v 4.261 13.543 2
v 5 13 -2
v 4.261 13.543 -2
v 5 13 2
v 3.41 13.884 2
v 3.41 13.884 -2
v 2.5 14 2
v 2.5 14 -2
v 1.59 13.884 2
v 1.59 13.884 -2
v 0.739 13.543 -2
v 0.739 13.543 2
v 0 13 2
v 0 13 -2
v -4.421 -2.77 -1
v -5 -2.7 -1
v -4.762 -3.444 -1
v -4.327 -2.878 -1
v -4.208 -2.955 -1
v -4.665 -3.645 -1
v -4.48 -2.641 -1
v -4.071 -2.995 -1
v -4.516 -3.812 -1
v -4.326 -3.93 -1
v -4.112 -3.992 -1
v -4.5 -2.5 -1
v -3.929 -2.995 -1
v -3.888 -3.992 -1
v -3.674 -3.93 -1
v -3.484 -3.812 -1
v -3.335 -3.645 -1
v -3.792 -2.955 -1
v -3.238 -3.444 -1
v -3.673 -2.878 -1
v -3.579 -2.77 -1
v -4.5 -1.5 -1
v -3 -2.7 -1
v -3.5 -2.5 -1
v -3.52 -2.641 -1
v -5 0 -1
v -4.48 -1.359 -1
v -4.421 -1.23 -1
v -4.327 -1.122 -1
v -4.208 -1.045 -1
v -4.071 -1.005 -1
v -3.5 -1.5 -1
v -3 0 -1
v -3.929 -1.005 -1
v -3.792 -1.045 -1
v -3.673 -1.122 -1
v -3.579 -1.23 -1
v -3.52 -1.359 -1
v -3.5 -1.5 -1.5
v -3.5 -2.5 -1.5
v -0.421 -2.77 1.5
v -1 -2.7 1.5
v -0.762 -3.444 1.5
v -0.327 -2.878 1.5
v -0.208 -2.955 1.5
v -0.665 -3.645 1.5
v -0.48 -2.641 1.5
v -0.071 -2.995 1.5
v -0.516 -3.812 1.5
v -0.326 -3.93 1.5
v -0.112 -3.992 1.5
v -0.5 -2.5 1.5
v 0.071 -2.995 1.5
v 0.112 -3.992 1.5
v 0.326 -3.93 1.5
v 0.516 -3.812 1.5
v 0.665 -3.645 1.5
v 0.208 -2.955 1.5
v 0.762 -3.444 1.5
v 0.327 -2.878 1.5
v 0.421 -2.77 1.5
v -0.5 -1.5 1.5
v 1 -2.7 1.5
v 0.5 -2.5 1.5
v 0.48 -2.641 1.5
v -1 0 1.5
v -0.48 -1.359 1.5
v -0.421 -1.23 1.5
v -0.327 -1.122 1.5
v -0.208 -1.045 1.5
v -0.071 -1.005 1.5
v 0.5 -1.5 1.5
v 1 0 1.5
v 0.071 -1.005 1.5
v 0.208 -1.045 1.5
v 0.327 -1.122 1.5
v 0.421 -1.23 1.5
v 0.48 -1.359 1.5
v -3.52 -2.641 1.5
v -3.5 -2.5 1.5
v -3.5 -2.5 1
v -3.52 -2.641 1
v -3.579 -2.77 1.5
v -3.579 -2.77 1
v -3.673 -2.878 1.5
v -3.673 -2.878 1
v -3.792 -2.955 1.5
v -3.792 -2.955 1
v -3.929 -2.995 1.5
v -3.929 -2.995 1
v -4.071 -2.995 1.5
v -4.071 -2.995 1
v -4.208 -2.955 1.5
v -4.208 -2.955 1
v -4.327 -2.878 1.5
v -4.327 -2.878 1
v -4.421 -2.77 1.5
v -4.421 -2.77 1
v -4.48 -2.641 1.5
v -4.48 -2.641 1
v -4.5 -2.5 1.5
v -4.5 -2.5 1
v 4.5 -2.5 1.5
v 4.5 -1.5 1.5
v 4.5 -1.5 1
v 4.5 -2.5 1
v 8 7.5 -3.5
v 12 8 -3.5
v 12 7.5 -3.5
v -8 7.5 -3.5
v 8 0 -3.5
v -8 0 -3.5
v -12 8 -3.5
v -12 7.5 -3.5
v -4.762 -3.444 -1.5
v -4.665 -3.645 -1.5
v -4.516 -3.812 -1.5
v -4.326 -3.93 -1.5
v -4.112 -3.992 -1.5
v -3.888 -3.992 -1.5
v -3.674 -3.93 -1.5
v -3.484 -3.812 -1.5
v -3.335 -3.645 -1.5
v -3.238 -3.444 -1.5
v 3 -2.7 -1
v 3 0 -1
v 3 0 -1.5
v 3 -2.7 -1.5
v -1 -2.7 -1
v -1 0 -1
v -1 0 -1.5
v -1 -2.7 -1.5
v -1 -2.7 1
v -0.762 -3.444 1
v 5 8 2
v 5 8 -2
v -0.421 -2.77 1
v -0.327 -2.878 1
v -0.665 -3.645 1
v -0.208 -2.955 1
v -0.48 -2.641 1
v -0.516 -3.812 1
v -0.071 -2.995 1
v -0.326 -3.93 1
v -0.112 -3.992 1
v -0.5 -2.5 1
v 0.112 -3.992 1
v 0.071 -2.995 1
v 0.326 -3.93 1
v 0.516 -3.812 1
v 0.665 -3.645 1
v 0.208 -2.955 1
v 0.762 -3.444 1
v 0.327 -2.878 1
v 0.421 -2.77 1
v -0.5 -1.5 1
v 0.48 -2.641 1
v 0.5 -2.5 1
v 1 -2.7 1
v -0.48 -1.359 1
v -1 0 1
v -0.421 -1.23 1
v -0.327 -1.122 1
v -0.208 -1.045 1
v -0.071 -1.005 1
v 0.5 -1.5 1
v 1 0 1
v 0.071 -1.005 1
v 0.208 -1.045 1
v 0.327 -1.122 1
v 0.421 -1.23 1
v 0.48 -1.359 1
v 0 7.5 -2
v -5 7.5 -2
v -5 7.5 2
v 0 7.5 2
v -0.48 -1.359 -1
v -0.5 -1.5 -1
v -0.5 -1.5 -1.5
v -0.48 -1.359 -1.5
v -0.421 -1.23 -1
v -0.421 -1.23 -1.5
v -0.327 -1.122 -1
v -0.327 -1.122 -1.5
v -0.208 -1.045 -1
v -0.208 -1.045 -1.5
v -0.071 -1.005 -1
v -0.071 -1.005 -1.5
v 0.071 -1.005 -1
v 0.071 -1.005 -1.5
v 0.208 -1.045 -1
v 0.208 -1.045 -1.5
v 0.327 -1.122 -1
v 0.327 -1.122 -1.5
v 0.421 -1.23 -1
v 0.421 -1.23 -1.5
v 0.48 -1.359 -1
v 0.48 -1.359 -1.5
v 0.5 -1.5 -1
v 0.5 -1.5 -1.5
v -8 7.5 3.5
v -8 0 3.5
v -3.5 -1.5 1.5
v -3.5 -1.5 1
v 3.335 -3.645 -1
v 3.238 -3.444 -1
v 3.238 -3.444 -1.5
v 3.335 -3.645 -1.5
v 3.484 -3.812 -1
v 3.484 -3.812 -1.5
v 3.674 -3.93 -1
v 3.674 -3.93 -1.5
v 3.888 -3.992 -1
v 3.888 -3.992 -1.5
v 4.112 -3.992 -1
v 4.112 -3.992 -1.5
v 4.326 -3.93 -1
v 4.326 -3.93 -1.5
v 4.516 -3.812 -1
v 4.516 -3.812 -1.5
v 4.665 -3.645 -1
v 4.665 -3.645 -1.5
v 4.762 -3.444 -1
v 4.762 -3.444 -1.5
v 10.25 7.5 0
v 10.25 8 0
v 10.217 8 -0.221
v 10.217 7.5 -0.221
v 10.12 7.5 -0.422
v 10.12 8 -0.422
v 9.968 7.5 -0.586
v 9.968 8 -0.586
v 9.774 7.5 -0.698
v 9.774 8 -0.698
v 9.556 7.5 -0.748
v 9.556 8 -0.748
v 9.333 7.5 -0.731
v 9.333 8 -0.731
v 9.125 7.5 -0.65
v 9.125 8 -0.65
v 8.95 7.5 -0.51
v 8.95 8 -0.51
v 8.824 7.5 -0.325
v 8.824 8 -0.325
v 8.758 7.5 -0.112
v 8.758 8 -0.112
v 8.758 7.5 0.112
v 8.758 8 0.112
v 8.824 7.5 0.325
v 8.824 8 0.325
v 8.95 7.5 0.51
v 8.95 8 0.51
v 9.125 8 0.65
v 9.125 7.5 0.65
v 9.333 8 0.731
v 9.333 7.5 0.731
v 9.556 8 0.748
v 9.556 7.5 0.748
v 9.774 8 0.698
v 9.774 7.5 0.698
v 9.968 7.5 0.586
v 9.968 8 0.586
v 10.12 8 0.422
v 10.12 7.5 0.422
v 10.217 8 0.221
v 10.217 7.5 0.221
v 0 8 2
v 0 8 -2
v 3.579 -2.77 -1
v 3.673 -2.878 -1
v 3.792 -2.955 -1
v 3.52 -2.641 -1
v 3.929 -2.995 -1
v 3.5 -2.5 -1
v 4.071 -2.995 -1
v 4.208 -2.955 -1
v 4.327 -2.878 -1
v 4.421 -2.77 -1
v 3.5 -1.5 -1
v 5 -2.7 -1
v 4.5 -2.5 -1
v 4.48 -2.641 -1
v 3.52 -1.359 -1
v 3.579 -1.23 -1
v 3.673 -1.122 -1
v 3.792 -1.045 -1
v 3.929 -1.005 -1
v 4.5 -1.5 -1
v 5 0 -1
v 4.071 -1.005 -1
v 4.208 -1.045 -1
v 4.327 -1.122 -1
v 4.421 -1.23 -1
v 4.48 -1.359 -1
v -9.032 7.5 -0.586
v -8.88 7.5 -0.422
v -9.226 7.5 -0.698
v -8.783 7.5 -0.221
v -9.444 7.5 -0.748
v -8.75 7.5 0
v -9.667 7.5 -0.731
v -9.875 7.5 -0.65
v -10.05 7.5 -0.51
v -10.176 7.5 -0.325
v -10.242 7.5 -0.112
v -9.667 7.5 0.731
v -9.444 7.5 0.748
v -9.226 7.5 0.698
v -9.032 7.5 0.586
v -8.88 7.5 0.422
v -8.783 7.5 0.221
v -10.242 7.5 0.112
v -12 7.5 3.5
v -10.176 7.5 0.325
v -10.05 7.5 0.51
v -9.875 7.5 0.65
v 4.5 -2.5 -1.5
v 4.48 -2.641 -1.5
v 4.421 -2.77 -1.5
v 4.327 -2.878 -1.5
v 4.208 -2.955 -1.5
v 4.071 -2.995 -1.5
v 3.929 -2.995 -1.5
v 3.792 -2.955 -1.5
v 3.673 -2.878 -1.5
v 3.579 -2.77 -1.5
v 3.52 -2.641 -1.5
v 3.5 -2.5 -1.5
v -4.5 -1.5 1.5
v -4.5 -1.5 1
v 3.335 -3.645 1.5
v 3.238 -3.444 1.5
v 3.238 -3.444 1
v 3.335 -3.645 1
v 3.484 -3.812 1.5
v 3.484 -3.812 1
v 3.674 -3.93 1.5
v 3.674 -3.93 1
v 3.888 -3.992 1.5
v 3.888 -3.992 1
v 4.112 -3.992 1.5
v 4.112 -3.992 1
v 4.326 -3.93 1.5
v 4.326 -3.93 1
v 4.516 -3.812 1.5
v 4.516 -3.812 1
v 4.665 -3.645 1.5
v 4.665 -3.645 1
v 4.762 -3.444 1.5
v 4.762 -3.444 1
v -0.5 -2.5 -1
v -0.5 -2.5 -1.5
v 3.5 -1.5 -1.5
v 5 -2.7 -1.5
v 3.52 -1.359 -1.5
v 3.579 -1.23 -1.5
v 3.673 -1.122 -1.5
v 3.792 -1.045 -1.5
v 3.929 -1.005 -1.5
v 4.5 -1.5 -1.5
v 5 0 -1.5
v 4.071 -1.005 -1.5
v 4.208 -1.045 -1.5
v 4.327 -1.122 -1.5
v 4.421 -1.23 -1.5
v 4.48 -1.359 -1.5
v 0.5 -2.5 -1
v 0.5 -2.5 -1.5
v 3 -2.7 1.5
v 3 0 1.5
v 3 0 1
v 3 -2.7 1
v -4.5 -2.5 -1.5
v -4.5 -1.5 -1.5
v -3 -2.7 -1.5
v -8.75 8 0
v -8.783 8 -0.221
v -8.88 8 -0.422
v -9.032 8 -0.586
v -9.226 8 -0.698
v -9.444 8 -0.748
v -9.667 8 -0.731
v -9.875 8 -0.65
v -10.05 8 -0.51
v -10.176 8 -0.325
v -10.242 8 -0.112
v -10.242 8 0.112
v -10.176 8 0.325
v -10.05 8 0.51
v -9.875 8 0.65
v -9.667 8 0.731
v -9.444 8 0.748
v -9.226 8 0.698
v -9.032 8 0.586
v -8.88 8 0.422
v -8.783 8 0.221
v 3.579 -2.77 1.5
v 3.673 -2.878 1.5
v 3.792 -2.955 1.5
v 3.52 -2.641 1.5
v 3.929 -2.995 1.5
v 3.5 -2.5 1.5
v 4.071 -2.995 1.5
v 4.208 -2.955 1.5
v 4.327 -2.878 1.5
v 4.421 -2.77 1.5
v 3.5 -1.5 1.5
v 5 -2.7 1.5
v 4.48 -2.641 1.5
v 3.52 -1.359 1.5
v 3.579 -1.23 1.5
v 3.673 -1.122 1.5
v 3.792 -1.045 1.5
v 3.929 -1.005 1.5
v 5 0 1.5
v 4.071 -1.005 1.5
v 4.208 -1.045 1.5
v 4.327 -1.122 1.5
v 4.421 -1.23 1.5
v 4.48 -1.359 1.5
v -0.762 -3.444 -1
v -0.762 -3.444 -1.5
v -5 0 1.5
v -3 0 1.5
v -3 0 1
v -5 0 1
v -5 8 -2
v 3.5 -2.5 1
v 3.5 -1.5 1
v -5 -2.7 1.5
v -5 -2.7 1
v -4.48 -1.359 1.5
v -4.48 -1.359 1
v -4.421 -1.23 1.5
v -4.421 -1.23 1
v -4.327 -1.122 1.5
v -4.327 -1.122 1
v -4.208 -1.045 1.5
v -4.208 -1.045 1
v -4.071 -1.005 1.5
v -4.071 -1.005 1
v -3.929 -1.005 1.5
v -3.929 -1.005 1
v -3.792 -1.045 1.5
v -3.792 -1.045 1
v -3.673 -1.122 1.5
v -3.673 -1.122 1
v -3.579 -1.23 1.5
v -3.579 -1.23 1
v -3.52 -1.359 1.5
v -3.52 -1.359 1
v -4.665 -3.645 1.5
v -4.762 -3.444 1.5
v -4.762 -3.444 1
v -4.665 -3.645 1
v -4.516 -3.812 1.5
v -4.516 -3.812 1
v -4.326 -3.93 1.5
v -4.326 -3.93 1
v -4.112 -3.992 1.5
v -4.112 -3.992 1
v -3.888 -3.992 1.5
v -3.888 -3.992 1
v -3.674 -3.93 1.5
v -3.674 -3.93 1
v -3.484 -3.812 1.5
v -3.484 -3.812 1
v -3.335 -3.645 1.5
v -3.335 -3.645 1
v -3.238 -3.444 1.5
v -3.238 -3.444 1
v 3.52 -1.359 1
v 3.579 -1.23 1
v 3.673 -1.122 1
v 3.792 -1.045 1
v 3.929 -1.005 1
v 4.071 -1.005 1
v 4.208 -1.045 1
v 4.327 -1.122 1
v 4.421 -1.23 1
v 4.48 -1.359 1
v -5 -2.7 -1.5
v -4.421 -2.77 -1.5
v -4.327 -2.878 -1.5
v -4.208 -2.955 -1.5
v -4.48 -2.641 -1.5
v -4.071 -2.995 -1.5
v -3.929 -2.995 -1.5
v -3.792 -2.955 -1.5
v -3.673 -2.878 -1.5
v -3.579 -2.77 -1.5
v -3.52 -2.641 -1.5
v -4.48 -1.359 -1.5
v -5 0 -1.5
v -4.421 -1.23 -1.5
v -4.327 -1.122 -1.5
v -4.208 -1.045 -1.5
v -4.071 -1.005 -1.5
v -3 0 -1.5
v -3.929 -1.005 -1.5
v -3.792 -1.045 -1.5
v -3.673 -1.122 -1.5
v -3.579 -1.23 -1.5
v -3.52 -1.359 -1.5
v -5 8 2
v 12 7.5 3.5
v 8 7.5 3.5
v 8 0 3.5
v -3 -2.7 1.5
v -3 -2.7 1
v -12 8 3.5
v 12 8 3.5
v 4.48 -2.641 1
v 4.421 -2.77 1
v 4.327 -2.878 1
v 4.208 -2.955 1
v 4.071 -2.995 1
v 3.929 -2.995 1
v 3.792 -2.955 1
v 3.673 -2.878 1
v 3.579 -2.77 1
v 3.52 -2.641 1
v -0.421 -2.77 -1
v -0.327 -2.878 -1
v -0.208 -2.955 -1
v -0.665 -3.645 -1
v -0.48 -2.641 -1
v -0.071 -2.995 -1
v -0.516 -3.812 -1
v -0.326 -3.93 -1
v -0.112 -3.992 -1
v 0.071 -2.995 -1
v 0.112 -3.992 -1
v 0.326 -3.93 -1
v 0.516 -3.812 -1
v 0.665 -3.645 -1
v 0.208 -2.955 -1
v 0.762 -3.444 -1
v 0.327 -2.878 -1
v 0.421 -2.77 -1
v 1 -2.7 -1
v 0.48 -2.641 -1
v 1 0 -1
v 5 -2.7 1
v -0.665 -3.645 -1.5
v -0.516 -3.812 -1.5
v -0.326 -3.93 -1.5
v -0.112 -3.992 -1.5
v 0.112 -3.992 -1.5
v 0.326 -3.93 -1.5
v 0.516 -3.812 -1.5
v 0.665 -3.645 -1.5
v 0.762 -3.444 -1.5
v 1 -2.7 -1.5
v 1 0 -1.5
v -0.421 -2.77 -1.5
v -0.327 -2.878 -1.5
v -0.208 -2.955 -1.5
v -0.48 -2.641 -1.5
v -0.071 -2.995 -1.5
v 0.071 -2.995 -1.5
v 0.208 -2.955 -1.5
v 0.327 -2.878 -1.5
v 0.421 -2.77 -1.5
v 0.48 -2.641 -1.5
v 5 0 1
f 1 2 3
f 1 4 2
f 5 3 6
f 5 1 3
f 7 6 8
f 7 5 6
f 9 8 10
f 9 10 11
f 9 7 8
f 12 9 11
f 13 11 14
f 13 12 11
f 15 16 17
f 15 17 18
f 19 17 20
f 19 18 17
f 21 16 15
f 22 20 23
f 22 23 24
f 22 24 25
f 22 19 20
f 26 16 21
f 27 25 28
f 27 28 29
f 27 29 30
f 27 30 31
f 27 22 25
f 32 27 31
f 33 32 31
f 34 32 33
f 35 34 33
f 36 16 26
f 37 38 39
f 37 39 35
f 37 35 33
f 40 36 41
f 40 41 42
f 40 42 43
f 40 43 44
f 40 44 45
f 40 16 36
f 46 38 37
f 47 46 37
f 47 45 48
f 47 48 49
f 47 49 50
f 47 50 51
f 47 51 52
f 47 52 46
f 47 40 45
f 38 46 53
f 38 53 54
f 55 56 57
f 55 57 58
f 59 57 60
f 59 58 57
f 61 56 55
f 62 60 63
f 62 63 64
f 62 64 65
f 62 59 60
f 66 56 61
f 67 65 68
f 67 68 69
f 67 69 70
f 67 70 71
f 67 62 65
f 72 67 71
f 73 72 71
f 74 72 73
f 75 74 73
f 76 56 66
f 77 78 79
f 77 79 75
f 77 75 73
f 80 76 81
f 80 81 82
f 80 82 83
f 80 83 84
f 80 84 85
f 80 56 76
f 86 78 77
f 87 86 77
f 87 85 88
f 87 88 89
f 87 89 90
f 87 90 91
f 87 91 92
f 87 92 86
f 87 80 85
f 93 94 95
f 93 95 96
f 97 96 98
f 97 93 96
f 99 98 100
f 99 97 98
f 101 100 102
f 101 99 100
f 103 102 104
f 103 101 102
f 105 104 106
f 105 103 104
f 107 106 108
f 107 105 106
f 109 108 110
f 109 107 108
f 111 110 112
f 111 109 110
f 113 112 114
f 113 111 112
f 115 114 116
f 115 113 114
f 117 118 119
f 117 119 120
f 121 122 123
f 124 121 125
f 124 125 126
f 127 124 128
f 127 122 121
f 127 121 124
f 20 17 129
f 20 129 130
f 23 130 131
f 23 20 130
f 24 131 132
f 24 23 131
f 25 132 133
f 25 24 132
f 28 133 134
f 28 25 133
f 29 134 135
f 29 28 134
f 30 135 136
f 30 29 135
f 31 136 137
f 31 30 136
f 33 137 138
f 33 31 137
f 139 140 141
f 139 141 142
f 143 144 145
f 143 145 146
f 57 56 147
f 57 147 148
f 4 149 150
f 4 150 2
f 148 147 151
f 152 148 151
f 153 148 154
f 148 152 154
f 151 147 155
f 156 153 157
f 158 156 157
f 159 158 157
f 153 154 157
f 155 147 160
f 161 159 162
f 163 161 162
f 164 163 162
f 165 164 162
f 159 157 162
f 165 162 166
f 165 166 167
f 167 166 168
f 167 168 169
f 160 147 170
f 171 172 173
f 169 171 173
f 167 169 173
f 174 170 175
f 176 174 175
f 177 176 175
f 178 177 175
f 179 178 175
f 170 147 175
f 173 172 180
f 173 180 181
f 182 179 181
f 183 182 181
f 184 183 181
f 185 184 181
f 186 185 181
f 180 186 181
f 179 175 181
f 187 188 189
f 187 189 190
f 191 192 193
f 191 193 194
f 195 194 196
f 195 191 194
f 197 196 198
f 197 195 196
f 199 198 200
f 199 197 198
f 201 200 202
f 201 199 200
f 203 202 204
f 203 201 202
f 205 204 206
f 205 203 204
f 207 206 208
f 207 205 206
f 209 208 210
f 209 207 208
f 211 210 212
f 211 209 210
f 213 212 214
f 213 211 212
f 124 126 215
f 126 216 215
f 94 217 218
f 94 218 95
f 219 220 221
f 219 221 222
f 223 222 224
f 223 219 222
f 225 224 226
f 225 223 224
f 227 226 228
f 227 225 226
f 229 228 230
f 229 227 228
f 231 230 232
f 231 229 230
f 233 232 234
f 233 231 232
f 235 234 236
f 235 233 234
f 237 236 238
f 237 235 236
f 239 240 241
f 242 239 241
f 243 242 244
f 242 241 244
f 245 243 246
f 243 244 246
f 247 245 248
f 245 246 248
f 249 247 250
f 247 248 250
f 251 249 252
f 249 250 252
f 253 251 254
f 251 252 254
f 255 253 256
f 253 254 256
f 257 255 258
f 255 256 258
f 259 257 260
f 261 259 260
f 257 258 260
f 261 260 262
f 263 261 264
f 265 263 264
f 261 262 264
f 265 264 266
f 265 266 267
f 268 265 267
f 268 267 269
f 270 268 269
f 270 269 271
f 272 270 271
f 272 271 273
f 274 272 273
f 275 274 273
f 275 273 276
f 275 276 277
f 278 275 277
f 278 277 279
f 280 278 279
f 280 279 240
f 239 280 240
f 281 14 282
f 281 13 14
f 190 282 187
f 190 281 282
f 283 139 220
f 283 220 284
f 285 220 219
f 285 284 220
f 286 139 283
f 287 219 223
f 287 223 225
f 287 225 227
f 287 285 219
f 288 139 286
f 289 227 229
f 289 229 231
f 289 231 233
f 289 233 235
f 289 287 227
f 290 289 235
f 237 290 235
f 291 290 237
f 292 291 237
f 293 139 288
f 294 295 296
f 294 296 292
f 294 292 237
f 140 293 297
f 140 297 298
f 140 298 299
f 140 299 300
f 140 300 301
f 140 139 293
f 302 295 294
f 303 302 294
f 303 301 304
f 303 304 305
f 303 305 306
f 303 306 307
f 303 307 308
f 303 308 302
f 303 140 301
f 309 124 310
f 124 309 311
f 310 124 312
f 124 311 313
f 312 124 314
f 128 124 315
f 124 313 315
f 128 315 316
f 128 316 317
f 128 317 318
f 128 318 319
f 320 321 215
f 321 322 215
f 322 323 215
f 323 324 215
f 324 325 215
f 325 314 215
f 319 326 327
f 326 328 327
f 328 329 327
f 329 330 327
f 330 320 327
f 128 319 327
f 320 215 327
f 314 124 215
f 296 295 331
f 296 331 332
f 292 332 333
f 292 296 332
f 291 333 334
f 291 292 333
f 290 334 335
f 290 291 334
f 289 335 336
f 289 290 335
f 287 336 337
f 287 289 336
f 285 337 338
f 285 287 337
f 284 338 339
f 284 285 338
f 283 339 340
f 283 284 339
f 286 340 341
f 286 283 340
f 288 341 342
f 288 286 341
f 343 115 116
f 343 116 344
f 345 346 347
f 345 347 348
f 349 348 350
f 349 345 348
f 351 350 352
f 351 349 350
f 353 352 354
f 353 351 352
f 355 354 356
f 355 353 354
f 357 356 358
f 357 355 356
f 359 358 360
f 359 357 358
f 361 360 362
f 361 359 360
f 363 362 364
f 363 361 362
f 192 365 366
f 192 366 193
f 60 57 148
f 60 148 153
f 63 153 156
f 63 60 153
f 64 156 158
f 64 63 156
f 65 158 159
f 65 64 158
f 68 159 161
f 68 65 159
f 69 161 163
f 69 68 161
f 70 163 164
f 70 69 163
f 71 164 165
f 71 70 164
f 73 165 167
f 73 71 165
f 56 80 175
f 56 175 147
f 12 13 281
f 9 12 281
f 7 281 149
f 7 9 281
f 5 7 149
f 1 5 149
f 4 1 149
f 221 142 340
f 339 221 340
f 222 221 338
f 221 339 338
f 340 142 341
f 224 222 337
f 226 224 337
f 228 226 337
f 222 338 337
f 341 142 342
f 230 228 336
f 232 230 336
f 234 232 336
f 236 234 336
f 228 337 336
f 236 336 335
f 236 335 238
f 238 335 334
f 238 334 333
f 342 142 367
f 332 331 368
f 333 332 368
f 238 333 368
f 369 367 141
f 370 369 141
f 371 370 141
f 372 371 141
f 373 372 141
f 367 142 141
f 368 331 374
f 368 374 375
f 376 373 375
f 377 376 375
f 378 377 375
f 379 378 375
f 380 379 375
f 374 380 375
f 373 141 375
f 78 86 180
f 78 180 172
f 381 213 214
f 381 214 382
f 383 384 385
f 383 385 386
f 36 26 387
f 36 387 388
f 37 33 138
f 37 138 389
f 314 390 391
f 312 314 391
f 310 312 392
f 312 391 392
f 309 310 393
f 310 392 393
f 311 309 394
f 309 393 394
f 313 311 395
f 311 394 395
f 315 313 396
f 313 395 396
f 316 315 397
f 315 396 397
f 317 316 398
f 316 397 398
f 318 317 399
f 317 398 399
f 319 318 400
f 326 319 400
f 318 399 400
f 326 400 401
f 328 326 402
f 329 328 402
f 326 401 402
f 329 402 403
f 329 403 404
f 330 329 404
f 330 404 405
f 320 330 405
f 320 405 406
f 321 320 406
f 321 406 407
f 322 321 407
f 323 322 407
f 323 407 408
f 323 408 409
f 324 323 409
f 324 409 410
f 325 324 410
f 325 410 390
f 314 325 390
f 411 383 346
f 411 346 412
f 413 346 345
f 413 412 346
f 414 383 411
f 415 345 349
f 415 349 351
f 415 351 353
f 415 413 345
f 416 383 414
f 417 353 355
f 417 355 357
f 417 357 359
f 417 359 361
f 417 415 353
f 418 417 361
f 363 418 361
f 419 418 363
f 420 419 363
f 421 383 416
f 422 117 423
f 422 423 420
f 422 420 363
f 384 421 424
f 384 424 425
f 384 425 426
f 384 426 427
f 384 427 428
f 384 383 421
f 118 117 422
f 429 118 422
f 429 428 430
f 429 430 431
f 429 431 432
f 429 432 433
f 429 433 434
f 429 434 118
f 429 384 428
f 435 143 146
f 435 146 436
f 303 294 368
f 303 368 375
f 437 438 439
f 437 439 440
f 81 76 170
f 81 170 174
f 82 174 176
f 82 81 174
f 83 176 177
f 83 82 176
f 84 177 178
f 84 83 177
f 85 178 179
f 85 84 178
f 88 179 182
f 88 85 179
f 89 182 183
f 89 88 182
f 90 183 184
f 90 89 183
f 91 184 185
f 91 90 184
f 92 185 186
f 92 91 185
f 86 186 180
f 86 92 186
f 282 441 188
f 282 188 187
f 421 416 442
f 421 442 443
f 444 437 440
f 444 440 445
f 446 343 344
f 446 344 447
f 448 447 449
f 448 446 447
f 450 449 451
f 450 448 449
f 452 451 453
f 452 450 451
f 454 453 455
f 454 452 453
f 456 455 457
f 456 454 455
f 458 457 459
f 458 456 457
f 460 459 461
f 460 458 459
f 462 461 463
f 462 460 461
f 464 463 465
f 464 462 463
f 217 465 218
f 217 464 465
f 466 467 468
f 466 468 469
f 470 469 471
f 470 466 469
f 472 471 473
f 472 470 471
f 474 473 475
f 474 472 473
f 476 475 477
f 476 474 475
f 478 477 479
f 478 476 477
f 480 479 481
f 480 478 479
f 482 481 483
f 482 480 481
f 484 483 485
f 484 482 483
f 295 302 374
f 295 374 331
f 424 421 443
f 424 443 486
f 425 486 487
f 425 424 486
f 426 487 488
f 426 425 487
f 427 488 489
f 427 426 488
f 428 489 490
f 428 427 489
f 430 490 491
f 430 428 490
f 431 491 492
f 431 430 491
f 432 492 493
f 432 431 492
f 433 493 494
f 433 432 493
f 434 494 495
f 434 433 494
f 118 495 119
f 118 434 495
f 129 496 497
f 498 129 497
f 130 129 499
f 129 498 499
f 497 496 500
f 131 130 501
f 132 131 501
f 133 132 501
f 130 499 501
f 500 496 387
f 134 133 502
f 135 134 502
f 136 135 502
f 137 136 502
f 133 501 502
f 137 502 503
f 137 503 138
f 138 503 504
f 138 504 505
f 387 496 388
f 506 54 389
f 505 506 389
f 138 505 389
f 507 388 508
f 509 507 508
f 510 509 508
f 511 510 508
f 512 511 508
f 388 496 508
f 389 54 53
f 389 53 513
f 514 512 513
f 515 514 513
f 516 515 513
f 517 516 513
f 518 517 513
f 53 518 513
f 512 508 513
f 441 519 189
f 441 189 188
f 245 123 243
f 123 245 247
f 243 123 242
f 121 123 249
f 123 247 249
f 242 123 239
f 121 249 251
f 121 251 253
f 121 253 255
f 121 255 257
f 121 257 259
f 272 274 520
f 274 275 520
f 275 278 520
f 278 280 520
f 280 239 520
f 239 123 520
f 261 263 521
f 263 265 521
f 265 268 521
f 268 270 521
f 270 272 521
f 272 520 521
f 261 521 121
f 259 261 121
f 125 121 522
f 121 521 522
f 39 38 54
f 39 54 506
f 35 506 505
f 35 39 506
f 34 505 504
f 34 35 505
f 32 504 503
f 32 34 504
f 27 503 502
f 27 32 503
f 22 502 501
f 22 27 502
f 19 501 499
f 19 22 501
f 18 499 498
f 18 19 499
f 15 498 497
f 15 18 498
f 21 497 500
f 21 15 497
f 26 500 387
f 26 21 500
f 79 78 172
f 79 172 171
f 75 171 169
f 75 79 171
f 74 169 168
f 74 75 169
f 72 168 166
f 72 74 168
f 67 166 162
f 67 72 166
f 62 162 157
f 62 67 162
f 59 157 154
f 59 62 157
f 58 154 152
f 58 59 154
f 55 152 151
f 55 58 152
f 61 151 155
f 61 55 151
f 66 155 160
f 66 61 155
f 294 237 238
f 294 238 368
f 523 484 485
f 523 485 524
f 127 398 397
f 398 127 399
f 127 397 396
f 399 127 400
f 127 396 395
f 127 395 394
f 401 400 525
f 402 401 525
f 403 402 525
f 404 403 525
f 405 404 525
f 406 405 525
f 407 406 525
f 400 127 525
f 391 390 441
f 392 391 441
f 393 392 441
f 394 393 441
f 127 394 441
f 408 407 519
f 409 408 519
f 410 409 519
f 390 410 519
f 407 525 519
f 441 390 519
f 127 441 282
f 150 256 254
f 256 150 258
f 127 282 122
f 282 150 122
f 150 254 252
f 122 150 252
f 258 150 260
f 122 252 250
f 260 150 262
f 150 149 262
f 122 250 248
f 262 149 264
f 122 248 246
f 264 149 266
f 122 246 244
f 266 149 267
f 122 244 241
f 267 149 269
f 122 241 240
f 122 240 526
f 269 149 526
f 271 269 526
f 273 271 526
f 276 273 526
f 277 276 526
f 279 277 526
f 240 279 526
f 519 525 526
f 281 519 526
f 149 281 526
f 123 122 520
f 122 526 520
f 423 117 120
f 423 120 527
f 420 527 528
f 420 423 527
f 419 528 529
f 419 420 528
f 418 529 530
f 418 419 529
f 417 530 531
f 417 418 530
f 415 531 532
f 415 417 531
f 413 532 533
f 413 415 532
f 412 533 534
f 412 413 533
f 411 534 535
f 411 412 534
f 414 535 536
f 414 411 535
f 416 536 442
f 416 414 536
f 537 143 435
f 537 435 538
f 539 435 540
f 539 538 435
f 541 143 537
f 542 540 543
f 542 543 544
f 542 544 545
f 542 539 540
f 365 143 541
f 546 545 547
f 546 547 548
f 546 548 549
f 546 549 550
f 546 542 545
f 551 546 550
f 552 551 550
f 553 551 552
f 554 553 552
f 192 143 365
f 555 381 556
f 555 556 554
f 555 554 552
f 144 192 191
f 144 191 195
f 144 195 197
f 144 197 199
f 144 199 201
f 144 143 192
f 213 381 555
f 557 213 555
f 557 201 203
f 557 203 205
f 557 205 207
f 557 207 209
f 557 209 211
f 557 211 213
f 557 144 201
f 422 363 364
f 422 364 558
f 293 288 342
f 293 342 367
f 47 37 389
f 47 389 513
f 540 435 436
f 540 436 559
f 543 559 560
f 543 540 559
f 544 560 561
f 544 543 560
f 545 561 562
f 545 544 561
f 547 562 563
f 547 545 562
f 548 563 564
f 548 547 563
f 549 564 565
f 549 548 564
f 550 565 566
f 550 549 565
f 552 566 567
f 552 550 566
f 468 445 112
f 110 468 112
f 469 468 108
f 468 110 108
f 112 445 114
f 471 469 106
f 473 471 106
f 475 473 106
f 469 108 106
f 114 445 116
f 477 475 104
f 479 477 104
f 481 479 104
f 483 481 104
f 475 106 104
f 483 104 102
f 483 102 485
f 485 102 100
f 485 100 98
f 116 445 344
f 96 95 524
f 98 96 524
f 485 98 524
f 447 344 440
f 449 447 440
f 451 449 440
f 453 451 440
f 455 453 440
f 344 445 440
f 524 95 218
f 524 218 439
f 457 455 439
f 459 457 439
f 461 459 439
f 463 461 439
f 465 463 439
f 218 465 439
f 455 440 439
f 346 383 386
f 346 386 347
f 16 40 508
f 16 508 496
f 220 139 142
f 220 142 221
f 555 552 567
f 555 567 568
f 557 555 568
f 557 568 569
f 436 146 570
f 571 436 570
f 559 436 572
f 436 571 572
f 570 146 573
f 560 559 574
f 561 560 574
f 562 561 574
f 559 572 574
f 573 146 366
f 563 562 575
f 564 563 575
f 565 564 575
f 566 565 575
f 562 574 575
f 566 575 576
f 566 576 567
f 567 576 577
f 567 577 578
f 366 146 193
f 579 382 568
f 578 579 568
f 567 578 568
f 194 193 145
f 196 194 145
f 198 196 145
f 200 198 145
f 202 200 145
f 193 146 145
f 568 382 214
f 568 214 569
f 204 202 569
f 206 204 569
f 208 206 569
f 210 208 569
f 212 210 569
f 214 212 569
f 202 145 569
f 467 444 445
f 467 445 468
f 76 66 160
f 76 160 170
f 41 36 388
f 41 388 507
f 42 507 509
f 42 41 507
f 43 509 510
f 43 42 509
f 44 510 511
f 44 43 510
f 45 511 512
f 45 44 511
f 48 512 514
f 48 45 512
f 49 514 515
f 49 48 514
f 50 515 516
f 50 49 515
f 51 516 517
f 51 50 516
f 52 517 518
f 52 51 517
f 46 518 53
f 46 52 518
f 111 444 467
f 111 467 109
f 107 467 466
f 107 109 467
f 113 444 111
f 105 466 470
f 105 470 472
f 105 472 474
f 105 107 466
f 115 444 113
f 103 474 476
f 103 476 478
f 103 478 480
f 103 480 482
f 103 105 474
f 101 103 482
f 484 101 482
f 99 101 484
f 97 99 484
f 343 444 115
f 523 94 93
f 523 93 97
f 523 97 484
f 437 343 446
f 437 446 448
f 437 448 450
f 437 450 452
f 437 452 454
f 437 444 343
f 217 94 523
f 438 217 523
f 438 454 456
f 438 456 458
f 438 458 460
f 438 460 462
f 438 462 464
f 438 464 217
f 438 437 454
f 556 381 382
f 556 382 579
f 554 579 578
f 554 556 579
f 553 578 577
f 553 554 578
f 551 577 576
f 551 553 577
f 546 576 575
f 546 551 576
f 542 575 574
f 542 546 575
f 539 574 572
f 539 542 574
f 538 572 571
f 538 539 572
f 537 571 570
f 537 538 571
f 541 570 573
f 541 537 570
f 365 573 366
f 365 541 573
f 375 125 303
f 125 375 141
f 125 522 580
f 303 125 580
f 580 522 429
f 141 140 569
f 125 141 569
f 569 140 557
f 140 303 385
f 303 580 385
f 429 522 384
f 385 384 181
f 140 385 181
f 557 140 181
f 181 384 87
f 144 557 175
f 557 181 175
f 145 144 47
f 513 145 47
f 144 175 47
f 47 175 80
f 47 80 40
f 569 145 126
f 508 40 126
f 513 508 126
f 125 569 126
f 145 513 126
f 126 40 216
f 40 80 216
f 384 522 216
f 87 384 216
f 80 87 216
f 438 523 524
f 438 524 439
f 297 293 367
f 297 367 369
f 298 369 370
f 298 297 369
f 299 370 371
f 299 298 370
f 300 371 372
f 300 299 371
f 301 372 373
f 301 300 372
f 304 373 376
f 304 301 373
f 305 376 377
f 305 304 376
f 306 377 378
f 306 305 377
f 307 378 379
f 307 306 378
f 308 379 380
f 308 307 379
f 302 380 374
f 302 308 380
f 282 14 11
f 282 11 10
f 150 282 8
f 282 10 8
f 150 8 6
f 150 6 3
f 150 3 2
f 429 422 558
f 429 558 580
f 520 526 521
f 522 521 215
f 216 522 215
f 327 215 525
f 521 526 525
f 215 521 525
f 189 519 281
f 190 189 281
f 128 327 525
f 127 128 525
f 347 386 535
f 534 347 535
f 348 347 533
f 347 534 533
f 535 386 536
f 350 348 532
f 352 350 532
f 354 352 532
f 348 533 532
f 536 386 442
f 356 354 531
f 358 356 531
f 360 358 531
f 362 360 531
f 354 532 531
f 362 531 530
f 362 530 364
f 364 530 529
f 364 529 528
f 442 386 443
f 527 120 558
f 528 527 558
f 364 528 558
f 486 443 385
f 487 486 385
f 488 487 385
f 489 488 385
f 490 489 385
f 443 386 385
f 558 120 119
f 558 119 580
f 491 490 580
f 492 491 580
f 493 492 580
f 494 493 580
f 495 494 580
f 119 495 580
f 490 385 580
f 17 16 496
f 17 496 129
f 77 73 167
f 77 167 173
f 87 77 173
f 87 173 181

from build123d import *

# Parameters (mm, degrees)
AUFSATZ_LINEAR_AUSTRAGEN1_DEPTH = 3.5
AUFSATZ_LINEAR_AUSTRAGEN2_DEPTH = 2
AUFSATZ_LINEAR_START            = -2
AUFSATZ_LINEAR_AUSTRAGEN3_DEPTH = 0.5
LINEARES_MUSTER1_COUNT          = 3
LINEARES_MUSTER1_PITCH          = 4
LINEARES_MUSTER1_COUNT_DIR2     = 2
LINEARES_MUSTER1_PITCH_DIR2     = 2.5
SKIZZE3_R                       = 0.75
SCHNITT_LINEAR_AUSTRAGEN1_DEPTH = 18.327723451
SKIZZE4_W                       = 5
SKIZZE4_H                       = 4
SCHNITT_LINEAR_AUSTRAGEN2_DEPTH = 0.5


with BuildPart() as part:
    # Skizze1 → Aufsatz-Linear austragen1 (new, symmetric)
    with BuildSketch(Plane.XY):
        Polygon((-12, 8), (-12, 7.5), (-8, 7.5), (-8, 0), (8, 0), (8, 7.5), (12, 7.5), (12, 8), align=None)
    extrude(amount=AUFSATZ_LINEAR_AUSTRAGEN1_DEPTH, both=True)

    # Skizze1<3> → Aufsatz-Linear austragen2 (add, symmetric)
    with BuildSketch(Plane.XY):
        with BuildLine():
            Line((0, 13), (0, 8))
            Line((0, 8), (5, 8))
            Line((5, 8), (5, 13))
            ThreePointArc((5, 13), (2.5, 14), (0, 13))
        make_face()
    extrude(amount=AUFSATZ_LINEAR_AUSTRAGEN2_DEPTH, both=True)


with BuildPart() as body_2:
    # Skizze2 → Aufsatz-Linear austragen3 (new body)
    with BuildSketch(Plane.XY.offset(3.5).offset(AUFSATZ_LINEAR_START)):
        with BuildLine():
            Line((-5, 0), (-5, -2.7))
            Line((-5, -2.7), (-4.76192799, -3.443855979))
            ThreePointArc((-4.76192799, -3.443855979), (-4, -4), (-3.23807201, -3.443855979))
            Line((-3.23807201, -3.443855979), (-3, -2.7))
            Line((-3, -2.7), (-3, 0))
            Line((-3, 0), (-5, 0))
        make_face()
        with BuildLine():
            Line((-3.5, -1.5), (-3.5, -2.5))
            ThreePointArc((-3.5, -2.5), (-4, -3), (-4.5, -2.5))
            Line((-4.5, -2.5), (-4.5, -1.5))
            ThreePointArc((-4.5, -1.5), (-4, -1), (-3.5, -1.5))
        make_face(mode=Mode.SUBTRACT)
    aufsatz_linear_austragen3 = extrude(amount=-AUFSATZ_LINEAR_AUSTRAGEN3_DEPTH)


with BuildPart() as part_1:
    add(part.part)

    # Lineares Muster1: Aufsatz-Linear austragen3 3 × 2
    with Locations(*[(i * LINEARES_MUSTER1_PITCH, 0, -j * LINEARES_MUSTER1_PITCH_DIR2) for i in range(LINEARES_MUSTER1_COUNT) for j in range(LINEARES_MUSTER1_COUNT_DIR2) if (i, j) != (0, 0)]):
        add(aufsatz_linear_austragen3)

    # Skizze3 → Schnitt-Linear austragen1 (cut, through all)
    with BuildSketch(Plane(origin=(0, 8, 0), x_dir=(1, 0, 0), z_dir=(0, 1, 0))):
        with Locations((-9.5, 0)):
            Circle(SKIZZE3_R)
        with Locations((9.5, 0)):
            Circle(SKIZZE3_R)
    extrude(amount=-SCHNITT_LINEAR_AUSTRAGEN1_DEPTH, mode=Mode.SUBTRACT)

    # Skizze4 → Schnitt-Linear austragen2 (cut)
    with BuildSketch(Plane(origin=(0, 8, 0), x_dir=(1, 0, 0), z_dir=(0, 1, 0))):
        with Locations((-2.5, 0)):
            Rectangle(SKIZZE4_W, SKIZZE4_H)
    extrude(amount=-SCHNITT_LINEAR_AUSTRAGEN2_DEPTH, mode=Mode.SUBTRACT)


solid = Compound([body_2.part, part_1.part])
